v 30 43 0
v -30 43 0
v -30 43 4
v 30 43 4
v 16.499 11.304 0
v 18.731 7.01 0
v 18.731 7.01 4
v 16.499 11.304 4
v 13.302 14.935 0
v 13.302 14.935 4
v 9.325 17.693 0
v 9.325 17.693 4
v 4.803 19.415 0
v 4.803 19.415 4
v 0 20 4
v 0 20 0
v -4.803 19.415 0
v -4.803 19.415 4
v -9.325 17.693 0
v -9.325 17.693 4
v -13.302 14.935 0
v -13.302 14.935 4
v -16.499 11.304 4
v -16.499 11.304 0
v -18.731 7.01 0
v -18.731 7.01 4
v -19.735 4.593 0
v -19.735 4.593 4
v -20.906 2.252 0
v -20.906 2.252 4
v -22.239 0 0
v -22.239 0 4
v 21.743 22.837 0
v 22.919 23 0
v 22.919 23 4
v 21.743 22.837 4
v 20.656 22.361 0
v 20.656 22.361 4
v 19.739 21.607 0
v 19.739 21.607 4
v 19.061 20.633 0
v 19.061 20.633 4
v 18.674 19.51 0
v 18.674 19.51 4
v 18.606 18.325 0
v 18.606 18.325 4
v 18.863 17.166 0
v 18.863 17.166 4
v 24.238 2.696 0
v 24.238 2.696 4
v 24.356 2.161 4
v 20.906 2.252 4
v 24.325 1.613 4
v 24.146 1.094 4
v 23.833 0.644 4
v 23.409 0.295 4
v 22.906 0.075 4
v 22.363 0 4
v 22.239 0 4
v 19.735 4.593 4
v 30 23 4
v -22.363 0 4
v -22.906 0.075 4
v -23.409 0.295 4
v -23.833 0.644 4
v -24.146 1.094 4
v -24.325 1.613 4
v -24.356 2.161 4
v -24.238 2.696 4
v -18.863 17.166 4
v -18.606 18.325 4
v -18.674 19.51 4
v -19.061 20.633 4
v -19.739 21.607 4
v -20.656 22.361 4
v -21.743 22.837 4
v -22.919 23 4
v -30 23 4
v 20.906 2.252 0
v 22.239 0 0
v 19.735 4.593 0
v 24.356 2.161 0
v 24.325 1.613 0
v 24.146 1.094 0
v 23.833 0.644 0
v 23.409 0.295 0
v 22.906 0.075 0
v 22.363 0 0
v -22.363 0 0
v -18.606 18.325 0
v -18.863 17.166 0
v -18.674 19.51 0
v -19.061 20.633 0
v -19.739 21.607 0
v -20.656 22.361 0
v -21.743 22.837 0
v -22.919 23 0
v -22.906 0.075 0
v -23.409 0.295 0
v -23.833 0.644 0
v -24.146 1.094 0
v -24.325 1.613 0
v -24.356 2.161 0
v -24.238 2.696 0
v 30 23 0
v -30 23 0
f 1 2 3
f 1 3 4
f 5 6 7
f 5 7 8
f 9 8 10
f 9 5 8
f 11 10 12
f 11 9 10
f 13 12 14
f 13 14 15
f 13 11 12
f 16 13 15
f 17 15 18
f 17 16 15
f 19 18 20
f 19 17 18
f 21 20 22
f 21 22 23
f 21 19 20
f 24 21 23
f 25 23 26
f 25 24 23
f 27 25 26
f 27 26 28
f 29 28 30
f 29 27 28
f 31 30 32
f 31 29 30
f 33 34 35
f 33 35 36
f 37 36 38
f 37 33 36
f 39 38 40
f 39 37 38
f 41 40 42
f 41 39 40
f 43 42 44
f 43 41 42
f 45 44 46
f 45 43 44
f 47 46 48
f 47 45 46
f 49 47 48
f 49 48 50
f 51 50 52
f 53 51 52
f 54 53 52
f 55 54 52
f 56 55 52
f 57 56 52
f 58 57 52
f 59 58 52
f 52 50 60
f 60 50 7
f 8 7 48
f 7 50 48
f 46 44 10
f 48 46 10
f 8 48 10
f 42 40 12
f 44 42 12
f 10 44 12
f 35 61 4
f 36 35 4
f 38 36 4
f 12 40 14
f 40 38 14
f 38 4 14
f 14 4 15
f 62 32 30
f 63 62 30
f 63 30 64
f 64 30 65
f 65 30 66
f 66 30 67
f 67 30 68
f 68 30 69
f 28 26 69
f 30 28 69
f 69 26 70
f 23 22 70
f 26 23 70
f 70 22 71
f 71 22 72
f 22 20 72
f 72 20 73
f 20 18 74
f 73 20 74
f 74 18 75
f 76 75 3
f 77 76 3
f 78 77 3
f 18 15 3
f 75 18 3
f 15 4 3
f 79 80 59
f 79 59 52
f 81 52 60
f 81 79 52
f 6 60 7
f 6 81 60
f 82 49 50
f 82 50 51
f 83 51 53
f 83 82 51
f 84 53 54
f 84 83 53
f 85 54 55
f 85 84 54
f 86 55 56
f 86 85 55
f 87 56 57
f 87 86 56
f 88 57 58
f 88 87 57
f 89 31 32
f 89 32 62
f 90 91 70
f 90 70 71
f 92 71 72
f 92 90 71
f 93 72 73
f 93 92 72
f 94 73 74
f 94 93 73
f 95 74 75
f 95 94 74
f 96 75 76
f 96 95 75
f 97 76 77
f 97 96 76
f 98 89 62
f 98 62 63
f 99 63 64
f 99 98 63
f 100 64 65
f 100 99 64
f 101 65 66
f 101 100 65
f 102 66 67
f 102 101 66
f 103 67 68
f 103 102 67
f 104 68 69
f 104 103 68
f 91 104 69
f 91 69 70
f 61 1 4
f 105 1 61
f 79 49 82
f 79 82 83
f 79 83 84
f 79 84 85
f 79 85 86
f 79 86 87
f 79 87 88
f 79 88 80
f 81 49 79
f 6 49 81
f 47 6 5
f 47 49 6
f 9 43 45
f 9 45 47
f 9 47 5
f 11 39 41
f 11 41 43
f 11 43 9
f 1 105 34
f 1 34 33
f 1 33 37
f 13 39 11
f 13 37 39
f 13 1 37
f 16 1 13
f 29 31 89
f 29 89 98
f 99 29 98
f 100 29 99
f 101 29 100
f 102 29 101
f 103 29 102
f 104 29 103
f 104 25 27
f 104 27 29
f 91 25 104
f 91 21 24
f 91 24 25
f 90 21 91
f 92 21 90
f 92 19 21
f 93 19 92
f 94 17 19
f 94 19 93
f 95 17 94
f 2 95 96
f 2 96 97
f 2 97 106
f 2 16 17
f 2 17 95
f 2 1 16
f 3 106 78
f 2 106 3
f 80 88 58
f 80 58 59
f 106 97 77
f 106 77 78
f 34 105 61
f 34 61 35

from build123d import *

# Parameters (mm, degrees)
EXTRUDE_1_DEPTH = 4


with BuildPart() as part:
    # 草图1 → 凸台-拉伸1 (new body)
    with BuildSketch(Plane.XY):
        with BuildLine():
            Line((-22.239358256, 0), (-22.36290973, 0))
            ThreePointArc((-22.36290973, 0), (-24.004989759, 0.858258708), (-24.237740304, 2.696426821))
            Line((-24.237740304, 2.696426821), (-18.862727252, 17.166344555))
            ThreePointArc((-18.862727252, 17.166344555), (-19.366277535, 21.143177652), (-22.918878713, 23))
            Line((-22.918878713, 23), (-30, 23))
            Line((-30, 23), (-30, 43))
            Line((-30, 43), (30, 43))
            Line((30, 43), (30, 23))
            Line((30, 23), (22.918878713, 23))
            ThreePointArc((22.918878713, 23), (19.366277535, 21.143177652), (18.862727252, 17.166344555))
            Line((18.862727252, 17.166344555), (24.237740304, 2.696426821))
            ThreePointArc((24.237740304, 2.696426821), (24.004989759, 0.858258708), (22.36290973, 0))
            Line((22.36290973, 0), (22.239358256, 0))
            ThreePointArc((22.239358256, 0), (20.299537687, 3.412102539), (18.731211271, 7.010115856))
            ThreePointArc((18.731211271, 7.010115856), (0, 20), (-18.731211271, 7.010115856))
            ThreePointArc((-18.731211271, 7.010115856), (-20.299537687, 3.412102539), (-22.239358256, 0))
        make_face()
    extrude(amount=EXTRUDE_1_DEPTH)


solid = part.part
